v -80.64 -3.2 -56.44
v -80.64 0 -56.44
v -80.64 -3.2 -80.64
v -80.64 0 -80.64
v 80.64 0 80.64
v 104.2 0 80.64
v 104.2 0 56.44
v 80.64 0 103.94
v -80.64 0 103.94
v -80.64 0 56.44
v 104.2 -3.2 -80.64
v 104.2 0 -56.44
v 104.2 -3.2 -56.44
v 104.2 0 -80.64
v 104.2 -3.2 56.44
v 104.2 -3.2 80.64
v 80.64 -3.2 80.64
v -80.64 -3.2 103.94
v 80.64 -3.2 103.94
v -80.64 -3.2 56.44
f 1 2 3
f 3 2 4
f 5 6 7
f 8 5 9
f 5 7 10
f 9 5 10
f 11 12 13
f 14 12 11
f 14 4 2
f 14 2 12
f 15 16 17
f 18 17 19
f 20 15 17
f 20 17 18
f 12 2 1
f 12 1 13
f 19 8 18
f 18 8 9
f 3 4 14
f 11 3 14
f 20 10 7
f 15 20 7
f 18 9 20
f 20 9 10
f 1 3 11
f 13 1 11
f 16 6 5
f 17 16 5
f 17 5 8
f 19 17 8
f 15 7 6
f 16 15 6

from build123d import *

# Parameters (mm, degrees)
BOSS_EXTRUDE1_DEPTH   = 3.2
SKETCH1_W             = 184.839561026
SKETCH1_H             = 24.2
BOSS_EXTRUDE1_2_DEPTH = 3.2


with BuildPart() as part:
    # Sketch1 → Boss-Extrude1 (new body)
    with BuildSketch(Plane(origin=(0, 0, 0), x_dir=(1, 0, 0), z_dir=(0, 1, 0))):
        Polygon((-80.639561026, -56.439561026), (104.2, -56.439561026), (104.2, -80.639561026), (80.639561026, -80.639561026), (80.639561026, -103.939561026), (-80.639561026, -103.939561026), align=None)
    extrude(amount=-BOSS_EXTRUDE1_DEPTH)


with BuildPart() as body_2:
    # Sketch1 → Boss-Extrude1 2 (new body)
    with BuildSketch(Plane(origin=(0, 0, 0), x_dir=(1, 0, 0), z_dir=(0, 1, 0))):
        with Locations((11.780219487, 68.539561026)):
            Rectangle(SKETCH1_W, SKETCH1_H)
    extrude(amount=-BOSS_EXTRUDE1_2_DEPTH)


solid = Compound([part.part, body_2.part])
